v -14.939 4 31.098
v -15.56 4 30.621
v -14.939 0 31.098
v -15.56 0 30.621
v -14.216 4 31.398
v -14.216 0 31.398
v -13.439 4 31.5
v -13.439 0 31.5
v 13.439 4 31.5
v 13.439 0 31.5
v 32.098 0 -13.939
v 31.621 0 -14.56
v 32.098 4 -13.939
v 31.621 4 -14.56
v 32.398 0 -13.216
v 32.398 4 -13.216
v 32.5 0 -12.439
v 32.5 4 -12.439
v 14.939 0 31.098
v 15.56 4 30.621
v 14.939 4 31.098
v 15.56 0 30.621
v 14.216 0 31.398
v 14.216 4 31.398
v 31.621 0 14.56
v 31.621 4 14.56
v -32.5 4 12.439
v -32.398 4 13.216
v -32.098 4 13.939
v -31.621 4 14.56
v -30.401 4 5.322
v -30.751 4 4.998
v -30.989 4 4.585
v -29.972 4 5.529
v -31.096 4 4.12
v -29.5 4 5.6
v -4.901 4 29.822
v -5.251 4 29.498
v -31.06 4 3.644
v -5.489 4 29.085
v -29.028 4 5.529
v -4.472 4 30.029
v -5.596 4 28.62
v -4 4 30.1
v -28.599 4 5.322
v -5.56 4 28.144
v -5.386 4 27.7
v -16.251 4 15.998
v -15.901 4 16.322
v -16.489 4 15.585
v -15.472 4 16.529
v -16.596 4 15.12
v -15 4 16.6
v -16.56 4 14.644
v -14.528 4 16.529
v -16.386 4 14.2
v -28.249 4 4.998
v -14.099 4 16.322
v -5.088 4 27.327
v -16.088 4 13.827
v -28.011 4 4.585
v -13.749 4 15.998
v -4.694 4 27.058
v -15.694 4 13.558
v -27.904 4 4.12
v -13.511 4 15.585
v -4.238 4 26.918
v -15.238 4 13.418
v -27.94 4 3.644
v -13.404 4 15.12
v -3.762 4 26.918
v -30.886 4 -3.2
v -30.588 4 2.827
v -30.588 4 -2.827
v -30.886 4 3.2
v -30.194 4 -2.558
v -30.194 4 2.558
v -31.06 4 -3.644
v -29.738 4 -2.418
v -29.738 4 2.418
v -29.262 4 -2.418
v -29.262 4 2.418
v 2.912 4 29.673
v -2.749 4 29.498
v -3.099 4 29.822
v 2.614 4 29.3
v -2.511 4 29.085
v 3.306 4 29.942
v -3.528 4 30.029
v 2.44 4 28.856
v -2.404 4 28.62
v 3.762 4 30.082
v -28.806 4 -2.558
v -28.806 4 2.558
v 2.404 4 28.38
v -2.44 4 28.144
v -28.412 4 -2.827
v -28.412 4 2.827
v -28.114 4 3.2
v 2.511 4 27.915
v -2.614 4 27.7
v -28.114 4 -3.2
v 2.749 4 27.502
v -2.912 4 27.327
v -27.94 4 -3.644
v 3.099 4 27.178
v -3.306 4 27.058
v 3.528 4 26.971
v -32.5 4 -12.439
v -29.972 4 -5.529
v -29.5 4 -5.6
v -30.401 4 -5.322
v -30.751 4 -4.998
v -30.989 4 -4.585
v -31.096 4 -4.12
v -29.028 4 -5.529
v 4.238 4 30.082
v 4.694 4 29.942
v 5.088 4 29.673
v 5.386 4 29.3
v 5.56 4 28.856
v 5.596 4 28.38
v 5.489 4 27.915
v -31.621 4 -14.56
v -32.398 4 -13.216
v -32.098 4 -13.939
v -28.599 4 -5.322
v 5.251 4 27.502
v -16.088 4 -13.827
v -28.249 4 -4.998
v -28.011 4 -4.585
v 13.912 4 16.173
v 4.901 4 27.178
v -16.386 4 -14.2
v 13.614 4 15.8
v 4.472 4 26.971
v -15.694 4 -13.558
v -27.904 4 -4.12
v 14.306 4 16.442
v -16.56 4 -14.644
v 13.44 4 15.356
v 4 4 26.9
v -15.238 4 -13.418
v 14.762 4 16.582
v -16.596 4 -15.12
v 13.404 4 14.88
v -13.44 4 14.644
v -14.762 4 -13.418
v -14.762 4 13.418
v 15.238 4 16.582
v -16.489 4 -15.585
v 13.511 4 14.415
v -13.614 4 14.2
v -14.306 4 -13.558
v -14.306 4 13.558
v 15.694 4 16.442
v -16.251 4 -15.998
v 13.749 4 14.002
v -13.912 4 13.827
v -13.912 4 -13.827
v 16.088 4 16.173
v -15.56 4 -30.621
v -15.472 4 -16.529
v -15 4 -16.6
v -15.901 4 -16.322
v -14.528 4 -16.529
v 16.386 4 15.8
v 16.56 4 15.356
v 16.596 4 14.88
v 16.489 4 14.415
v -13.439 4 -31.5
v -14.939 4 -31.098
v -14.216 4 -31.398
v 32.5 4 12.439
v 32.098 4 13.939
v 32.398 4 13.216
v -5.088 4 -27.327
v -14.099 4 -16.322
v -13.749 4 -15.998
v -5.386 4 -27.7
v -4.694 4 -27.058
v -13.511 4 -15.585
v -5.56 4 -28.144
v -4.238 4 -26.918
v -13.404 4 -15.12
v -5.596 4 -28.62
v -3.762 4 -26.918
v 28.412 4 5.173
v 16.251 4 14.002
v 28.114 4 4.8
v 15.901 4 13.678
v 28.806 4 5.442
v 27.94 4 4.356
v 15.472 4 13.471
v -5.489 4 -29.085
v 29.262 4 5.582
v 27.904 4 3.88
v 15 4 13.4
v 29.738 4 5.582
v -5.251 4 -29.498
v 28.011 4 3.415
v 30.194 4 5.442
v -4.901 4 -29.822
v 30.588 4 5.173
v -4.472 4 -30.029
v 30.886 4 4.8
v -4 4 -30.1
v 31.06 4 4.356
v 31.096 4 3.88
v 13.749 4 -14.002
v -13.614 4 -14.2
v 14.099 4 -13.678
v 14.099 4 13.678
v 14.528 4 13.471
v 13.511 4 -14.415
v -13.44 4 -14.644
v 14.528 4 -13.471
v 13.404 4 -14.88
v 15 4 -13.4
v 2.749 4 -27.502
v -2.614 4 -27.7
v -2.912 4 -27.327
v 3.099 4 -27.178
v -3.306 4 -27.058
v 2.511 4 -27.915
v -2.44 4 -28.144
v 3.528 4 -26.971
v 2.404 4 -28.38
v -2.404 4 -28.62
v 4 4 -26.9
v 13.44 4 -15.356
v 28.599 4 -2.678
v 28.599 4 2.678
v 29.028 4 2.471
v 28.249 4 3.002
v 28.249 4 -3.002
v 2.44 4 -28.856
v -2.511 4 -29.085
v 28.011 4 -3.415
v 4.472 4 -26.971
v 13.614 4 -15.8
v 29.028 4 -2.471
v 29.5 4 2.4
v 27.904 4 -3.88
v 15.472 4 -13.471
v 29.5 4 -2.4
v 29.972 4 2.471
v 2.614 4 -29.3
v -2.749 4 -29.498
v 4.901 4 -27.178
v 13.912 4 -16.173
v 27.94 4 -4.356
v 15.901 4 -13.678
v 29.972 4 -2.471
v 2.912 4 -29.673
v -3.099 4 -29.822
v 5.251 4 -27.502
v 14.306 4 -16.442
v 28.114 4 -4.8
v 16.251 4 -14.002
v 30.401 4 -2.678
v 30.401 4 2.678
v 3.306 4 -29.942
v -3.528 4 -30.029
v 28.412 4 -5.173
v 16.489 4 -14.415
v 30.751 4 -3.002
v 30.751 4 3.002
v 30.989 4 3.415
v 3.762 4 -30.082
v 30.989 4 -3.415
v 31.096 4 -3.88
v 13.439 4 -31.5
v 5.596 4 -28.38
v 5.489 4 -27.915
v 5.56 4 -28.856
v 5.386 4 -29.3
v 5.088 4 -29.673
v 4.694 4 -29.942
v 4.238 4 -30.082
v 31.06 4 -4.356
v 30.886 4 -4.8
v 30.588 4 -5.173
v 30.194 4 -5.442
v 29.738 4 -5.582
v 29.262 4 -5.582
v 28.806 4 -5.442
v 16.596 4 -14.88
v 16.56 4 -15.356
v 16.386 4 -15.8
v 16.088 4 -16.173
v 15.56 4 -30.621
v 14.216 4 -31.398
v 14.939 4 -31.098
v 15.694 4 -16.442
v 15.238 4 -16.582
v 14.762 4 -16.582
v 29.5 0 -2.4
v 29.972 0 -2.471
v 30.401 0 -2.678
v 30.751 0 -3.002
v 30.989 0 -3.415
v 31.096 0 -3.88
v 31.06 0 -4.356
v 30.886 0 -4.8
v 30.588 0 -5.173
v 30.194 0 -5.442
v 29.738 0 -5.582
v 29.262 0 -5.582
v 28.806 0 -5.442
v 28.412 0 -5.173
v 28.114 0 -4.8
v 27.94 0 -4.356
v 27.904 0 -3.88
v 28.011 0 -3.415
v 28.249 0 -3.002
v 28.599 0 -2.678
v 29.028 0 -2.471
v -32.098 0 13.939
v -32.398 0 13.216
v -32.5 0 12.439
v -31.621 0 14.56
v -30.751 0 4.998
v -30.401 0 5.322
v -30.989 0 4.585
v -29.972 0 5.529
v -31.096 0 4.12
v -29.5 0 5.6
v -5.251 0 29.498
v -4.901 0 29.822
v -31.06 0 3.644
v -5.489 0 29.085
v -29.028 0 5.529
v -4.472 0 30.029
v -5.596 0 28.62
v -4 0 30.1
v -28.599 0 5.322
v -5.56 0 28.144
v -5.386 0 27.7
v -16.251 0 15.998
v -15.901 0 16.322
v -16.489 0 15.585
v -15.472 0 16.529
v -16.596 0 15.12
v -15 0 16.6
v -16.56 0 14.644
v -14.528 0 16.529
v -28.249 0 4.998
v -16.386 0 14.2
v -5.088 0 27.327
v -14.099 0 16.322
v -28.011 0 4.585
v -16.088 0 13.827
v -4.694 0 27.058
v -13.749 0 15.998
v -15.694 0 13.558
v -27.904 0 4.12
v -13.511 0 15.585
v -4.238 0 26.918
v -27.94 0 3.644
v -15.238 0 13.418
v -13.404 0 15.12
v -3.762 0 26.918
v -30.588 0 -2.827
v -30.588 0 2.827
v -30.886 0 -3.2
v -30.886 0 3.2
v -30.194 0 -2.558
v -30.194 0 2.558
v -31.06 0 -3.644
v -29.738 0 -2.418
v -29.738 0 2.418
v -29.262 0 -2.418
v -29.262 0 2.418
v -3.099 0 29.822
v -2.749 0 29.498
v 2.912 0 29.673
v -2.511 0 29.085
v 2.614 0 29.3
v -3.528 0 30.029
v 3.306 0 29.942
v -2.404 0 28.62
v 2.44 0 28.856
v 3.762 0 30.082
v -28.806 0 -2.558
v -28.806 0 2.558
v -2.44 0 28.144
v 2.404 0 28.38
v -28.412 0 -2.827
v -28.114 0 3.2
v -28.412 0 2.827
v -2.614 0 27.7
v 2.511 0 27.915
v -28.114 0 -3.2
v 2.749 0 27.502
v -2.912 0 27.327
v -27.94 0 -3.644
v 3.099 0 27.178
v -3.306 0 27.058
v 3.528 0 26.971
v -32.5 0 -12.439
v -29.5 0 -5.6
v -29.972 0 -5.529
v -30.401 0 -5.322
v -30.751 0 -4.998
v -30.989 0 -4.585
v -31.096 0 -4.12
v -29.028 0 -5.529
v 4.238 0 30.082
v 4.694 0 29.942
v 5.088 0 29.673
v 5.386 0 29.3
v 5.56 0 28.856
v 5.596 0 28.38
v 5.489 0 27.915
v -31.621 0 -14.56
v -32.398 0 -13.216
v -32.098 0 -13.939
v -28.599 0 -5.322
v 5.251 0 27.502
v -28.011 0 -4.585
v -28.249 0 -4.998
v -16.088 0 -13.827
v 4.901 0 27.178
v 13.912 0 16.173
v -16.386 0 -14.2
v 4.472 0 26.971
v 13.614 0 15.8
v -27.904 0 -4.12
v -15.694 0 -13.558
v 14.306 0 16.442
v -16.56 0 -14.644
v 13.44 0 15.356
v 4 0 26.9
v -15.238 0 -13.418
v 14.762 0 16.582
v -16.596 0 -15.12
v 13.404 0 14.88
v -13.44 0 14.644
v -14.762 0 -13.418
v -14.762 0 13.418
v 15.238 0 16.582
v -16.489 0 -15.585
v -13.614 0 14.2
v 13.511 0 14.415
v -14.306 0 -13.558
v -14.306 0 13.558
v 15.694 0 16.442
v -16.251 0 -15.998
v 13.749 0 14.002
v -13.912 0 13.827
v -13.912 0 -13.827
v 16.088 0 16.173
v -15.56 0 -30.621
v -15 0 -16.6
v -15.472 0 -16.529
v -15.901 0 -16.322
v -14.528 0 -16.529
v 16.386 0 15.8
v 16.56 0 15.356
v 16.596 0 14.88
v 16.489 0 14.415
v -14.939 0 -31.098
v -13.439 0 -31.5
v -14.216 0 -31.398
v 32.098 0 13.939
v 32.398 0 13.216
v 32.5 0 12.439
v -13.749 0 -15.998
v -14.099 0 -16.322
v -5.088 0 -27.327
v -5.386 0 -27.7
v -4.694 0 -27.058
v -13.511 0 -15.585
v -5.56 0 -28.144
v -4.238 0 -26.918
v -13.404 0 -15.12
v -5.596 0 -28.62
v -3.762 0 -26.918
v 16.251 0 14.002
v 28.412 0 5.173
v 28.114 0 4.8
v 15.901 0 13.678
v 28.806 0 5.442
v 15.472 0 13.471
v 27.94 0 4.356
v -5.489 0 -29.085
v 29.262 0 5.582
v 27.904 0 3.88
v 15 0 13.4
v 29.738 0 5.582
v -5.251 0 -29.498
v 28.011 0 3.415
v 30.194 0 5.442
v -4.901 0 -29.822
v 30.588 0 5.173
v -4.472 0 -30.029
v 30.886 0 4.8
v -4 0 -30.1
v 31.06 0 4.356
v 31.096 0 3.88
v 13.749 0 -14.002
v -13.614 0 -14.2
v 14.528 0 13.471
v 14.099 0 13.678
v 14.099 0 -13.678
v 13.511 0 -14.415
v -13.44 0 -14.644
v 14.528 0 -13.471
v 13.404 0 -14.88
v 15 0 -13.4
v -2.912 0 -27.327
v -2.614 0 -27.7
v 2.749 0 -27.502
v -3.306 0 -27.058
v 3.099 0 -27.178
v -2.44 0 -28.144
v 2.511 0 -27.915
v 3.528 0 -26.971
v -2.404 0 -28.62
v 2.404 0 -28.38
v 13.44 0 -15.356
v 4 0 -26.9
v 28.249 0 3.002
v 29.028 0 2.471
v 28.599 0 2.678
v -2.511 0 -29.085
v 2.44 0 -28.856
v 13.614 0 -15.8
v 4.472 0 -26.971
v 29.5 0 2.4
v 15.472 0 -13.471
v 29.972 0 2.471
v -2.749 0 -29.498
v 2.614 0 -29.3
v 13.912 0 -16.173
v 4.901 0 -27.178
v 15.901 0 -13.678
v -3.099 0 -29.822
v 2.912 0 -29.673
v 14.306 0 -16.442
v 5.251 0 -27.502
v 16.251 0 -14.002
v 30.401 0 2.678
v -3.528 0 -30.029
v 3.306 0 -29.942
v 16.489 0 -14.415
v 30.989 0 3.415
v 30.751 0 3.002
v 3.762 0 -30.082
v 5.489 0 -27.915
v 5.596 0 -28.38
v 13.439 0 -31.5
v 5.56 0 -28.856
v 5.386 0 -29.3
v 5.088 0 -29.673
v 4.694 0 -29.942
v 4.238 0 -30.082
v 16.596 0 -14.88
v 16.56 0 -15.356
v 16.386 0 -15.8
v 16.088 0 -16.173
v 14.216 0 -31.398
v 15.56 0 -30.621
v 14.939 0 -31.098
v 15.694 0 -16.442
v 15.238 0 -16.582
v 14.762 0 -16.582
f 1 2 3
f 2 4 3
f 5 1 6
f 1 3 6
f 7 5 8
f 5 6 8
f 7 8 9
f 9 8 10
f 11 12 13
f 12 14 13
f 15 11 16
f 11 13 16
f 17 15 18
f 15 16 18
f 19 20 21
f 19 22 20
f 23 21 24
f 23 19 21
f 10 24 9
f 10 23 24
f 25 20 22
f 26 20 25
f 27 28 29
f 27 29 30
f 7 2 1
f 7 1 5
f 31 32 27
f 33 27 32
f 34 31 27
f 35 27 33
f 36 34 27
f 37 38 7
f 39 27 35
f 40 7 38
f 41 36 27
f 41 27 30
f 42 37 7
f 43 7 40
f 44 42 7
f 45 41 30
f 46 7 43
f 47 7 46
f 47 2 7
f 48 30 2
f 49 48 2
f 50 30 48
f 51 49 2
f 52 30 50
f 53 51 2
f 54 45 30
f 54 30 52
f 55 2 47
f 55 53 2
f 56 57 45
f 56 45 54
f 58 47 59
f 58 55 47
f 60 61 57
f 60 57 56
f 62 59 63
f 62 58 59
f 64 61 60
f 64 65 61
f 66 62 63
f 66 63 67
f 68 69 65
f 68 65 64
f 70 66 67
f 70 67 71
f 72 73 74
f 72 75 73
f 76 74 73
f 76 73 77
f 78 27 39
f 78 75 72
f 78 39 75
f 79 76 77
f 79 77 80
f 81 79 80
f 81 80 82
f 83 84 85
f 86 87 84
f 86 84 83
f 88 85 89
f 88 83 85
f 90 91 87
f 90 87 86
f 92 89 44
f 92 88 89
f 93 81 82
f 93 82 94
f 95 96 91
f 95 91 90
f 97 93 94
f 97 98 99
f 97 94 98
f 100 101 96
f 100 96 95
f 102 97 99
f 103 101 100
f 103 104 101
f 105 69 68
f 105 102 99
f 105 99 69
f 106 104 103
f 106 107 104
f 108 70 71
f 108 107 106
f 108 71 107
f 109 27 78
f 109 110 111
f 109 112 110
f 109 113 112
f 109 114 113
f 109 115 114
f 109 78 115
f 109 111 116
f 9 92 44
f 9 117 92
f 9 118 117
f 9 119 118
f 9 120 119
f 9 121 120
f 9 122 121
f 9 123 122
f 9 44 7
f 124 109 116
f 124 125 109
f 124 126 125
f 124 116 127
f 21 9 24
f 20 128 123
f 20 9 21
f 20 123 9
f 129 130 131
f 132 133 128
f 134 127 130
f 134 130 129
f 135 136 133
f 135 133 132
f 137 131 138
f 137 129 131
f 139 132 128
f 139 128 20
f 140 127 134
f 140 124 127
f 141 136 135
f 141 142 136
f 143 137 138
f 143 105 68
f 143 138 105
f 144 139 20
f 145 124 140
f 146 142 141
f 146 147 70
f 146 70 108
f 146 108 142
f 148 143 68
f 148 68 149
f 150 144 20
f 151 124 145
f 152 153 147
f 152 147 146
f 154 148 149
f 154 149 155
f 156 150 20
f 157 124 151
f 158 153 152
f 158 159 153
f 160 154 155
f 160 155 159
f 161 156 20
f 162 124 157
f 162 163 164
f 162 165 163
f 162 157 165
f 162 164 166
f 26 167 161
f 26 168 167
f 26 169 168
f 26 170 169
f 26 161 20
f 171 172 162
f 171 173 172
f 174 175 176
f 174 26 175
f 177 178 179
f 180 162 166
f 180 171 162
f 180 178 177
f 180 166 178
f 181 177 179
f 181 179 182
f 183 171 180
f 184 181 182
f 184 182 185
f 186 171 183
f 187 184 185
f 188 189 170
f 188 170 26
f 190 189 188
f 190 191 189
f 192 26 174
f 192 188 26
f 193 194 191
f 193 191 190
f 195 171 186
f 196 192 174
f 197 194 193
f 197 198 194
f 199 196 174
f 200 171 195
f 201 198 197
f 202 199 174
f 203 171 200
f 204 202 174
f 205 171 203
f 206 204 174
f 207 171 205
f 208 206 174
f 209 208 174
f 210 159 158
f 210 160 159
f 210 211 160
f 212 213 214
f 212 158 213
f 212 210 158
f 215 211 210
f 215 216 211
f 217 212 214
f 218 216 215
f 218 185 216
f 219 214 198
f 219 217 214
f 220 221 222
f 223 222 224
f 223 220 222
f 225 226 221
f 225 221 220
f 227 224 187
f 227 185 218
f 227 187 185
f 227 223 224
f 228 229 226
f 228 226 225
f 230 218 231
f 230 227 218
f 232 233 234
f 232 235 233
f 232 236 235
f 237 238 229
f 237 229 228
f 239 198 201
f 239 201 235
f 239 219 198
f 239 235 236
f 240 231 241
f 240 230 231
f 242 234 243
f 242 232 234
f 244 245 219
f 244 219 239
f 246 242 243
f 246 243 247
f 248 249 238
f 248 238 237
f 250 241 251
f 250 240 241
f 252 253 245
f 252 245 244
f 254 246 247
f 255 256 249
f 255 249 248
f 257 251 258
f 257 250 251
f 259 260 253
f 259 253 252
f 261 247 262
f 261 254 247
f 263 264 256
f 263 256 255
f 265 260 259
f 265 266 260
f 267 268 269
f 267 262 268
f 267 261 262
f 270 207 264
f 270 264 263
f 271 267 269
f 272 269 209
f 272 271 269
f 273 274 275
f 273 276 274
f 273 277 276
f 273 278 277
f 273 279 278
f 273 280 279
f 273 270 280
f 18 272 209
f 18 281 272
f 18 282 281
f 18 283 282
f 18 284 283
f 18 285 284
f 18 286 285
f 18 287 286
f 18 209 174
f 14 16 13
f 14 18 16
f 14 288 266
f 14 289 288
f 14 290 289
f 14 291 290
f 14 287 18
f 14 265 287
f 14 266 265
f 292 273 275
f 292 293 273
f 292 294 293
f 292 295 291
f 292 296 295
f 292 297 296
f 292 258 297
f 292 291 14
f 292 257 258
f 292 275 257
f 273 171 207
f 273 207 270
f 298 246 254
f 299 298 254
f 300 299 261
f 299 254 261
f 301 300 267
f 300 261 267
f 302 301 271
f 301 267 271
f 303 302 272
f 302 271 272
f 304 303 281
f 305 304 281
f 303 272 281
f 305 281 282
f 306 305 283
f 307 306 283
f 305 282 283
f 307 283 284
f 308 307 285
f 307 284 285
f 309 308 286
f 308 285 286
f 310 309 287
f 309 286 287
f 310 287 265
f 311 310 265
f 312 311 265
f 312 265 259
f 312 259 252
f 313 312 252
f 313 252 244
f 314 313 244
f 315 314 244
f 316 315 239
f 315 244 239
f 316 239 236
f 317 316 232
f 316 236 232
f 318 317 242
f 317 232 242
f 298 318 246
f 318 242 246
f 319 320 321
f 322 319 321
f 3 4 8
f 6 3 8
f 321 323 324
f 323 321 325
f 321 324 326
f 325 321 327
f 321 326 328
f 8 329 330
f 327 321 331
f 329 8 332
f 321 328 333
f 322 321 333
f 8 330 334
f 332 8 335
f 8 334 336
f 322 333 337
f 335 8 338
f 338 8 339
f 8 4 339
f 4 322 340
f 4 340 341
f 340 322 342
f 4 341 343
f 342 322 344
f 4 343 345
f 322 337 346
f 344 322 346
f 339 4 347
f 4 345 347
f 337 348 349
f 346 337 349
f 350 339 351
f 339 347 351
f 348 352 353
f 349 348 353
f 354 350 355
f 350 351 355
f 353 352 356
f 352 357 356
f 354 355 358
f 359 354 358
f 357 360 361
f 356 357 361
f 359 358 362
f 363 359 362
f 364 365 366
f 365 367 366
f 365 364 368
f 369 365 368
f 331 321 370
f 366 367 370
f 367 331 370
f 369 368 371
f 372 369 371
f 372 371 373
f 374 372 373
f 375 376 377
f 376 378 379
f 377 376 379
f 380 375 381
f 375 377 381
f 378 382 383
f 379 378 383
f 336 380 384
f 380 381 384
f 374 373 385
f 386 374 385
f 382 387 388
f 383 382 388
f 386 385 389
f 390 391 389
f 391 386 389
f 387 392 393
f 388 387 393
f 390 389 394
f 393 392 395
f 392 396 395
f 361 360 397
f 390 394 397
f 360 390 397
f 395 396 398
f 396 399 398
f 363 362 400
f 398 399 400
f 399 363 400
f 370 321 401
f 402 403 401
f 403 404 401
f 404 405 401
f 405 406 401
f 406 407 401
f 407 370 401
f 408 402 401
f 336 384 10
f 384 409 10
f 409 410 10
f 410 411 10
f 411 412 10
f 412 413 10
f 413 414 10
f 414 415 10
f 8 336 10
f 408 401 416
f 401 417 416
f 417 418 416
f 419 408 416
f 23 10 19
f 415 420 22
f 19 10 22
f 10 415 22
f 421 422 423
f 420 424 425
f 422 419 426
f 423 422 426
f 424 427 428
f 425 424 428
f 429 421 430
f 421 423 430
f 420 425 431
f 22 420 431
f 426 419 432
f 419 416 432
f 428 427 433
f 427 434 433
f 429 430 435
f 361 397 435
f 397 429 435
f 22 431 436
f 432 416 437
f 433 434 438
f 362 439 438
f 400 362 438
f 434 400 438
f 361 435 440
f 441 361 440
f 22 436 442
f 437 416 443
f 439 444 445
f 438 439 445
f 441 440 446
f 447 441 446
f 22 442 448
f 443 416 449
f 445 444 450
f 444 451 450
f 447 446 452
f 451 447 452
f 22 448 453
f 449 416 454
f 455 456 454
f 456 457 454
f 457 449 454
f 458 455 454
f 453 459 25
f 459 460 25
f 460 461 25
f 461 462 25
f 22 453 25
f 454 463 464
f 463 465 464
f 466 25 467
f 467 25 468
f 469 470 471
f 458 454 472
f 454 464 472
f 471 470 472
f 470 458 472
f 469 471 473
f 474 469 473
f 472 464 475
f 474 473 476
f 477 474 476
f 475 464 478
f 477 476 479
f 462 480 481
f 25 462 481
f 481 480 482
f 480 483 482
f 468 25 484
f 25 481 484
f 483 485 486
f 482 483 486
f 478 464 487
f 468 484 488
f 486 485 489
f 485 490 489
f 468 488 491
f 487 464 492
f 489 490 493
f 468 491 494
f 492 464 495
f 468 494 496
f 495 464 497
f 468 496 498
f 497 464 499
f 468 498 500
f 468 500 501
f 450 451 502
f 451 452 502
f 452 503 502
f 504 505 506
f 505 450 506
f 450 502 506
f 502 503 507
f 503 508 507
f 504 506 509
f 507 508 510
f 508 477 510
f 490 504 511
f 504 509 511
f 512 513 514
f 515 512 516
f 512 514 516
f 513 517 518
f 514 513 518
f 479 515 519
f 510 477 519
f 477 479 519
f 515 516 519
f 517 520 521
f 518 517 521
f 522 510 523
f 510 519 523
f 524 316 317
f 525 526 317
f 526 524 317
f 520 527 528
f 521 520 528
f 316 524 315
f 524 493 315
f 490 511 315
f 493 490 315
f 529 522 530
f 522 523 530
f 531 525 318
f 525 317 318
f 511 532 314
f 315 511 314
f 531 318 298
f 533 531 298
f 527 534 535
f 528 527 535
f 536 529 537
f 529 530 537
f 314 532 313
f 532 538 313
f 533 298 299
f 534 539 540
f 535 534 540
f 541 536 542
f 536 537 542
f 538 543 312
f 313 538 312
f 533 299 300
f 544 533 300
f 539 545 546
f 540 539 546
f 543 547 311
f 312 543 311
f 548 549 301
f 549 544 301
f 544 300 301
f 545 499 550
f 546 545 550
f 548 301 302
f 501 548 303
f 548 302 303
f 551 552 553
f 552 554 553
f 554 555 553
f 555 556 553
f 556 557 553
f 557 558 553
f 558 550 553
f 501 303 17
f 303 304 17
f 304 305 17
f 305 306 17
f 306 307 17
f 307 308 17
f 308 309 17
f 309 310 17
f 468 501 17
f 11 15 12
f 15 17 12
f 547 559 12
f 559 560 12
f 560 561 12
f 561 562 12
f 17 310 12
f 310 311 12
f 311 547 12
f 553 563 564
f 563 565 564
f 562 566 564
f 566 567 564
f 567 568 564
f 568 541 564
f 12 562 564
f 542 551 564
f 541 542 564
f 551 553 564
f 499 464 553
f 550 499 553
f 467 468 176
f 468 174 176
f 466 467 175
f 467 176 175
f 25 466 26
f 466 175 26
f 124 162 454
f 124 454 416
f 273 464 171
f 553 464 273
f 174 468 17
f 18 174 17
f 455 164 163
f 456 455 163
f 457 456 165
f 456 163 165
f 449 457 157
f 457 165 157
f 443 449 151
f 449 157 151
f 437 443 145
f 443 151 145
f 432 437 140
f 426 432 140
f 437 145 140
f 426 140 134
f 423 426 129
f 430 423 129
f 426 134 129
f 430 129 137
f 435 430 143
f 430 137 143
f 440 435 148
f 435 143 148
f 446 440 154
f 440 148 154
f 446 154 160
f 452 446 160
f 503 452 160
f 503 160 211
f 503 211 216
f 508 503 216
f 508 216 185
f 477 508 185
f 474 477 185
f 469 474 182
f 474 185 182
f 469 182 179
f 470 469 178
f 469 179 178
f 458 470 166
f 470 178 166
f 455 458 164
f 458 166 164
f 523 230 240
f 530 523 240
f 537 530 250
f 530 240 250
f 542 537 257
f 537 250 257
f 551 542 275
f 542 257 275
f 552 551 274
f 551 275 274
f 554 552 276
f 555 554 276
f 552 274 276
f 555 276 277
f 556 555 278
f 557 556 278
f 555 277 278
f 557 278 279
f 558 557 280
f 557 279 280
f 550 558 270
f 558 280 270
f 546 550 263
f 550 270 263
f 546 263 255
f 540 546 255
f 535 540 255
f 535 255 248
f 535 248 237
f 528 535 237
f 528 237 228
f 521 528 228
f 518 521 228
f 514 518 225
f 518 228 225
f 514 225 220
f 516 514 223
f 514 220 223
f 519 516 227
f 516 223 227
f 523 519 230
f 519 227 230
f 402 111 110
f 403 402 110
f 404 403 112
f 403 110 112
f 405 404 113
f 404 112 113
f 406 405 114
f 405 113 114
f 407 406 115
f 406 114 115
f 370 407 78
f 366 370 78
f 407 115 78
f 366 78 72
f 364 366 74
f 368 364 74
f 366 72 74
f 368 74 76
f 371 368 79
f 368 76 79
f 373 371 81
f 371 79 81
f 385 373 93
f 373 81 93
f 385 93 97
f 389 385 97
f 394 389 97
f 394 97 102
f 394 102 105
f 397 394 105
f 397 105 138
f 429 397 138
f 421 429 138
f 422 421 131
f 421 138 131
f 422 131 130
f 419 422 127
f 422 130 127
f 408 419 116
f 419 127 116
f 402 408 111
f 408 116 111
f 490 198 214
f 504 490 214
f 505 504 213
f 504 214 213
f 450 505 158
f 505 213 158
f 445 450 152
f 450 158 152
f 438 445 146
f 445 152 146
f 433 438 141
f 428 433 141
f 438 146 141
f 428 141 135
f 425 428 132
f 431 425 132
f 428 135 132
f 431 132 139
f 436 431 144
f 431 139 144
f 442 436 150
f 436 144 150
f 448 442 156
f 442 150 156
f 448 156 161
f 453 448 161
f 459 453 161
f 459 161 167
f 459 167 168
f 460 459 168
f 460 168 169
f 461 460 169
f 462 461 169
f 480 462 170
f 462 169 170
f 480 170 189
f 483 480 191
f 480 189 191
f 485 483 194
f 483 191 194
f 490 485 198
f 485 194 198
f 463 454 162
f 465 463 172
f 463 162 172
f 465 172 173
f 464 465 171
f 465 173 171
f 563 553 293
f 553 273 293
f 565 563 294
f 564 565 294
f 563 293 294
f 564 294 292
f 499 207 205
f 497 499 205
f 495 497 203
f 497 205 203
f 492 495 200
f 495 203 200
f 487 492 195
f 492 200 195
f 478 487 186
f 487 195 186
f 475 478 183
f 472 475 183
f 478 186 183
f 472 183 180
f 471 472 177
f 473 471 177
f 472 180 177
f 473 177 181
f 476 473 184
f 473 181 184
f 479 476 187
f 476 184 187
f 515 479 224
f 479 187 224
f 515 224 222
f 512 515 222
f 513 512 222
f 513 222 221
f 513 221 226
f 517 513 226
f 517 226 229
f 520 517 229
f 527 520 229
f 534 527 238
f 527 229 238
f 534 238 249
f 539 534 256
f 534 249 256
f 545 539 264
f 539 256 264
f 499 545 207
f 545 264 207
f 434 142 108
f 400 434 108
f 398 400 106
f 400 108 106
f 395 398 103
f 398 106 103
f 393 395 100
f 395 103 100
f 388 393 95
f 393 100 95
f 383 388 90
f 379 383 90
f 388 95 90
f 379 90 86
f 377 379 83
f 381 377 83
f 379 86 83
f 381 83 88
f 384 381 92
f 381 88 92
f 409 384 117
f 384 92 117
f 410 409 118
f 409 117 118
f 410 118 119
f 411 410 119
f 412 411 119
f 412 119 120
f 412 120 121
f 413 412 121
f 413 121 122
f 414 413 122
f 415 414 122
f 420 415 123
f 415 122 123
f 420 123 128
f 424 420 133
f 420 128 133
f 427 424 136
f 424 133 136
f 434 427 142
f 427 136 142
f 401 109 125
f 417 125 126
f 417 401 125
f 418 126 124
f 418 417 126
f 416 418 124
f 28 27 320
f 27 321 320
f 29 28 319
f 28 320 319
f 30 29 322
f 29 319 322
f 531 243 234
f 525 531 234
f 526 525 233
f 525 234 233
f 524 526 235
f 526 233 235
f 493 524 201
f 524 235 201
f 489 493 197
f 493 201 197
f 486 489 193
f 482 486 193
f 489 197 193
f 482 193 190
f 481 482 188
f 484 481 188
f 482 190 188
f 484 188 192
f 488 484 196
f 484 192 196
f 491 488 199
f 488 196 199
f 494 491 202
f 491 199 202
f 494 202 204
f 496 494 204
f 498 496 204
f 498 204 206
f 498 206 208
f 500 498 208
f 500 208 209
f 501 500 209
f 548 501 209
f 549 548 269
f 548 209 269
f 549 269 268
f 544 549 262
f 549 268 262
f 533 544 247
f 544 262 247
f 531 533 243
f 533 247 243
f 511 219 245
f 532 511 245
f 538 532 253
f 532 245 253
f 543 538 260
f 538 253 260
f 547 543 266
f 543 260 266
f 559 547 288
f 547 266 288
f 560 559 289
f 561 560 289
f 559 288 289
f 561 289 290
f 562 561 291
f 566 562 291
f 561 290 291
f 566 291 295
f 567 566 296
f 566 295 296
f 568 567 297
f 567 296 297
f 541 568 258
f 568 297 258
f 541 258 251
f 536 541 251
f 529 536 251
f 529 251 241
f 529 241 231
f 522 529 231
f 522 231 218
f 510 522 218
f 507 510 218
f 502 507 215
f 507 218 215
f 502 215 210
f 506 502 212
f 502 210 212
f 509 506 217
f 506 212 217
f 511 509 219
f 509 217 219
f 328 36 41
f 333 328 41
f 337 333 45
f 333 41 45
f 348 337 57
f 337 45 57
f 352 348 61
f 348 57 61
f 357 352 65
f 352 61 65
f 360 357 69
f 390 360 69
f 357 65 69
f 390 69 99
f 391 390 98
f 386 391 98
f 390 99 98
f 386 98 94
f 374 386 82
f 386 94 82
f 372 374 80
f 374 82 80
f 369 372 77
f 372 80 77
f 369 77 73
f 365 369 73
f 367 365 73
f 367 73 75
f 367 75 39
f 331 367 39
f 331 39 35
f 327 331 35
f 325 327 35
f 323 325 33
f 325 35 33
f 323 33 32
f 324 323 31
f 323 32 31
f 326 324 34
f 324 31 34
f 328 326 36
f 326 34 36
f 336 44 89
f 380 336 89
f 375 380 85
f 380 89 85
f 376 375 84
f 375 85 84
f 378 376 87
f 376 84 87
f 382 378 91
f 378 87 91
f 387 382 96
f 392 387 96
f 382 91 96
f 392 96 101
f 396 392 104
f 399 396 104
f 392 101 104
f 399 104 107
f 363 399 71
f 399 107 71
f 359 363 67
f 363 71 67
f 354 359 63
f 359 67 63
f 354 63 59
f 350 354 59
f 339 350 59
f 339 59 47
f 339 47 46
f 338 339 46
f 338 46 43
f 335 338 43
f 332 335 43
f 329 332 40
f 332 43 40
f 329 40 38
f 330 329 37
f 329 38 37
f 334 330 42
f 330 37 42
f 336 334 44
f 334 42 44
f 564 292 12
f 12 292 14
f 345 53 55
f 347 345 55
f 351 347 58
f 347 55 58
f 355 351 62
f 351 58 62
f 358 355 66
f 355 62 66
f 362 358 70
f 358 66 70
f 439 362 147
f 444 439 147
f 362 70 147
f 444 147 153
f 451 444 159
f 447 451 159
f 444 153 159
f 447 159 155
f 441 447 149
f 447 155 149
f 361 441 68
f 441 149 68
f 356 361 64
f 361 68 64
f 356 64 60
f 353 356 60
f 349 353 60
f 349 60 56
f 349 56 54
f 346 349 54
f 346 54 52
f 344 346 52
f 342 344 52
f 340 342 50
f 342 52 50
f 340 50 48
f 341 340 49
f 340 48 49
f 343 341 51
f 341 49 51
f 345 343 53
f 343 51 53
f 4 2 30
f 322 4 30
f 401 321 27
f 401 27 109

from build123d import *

# Parameters (mm, degrees)
SKETCH_1_W          = 65
SKETCH_1_H          = 63
EXTRUDE_1_DEPTH     = 4
SKETCH_2_R          = 1.6
CUT_EXTRUDE_1_DEPTH = 4
SKETCH_3_R          = 1.6
CUT_EXTRUDE_2_DEPTH = 4
FILLET_1_R          = 3
CUT_EXTRUDE_3_DEPTH = 10
FILLET_2_R          = 3


with BuildPart() as part:
    # 草图1 → 凸台-拉伸1 (new body)
    with BuildSketch(Plane(origin=(0, 0, 0), x_dir=(1, 0, 0), z_dir=(0, 1, 0))):
        Rectangle(SKETCH_1_W, SKETCH_1_H)
    extrude(amount=EXTRUDE_1_DEPTH)

    # 草图2 → 切除-拉伸1 (cut)
    with BuildSketch(Plane(origin=(0, 4, 0), x_dir=(1, 0, 0), z_dir=(0, 1, 0))):
        with Locations(Location((-15, -15, 0), (0, 0, 270))):
            Circle(SKETCH_2_R)
        with Locations(Location((-15, 15, 0), (0, 0, 90))):
            Circle(SKETCH_2_R)
        with Locations(Location((15, 15, 0), (0, 0, 270))):
            Circle(SKETCH_2_R)
        with Locations(Location((15, -15, 0), (0, 0, 90))):
            Circle(SKETCH_2_R)
    extrude(amount=-CUT_EXTRUDE_1_DEPTH, mode=Mode.SUBTRACT)

    # 草图3 → 切除-拉伸2 (cut)
    with BuildSketch(Plane(origin=(0, 4, 0), x_dir=(1, 0, 0), z_dir=(0, 1, 0))):
        with Locations(Location((-4, -28.5, 0), (0, 0, 270))):
            Circle(SKETCH_3_R)
        with Locations(Location((4, -28.5, 0), (0, 0, 90))):
            Circle(SKETCH_3_R)
        with Locations(Location((4, 28.5, 0), (0, 0, 270))):
            Circle(SKETCH_3_R)
        with Locations(Location((-4, 28.5, 0), (0, 0, 90))):
            Circle(SKETCH_3_R)
        with Locations(Location((-29.5, -4, 0), (0, 0, 270))):
            Circle(SKETCH_3_R)
        with Locations(Location((-29.5, 4, 0), (0, 0, 90))):
            Circle(SKETCH_3_R)
        with Locations(Location((29.5, 4, 0), (0, 0, 270))):
            Circle(SKETCH_3_R)
        with Locations(Location((29.5, -4, 0), (0, 0, 90))):
            Circle(SKETCH_3_R)
    extrude(amount=-CUT_EXTRUDE_2_DEPTH, mode=Mode.SUBTRACT)

    # 圆角1
    fillet_1_edges = [part.edges().sort_by_distance(p)[0] for p in [
        (32.5, 2, 31.5),
        (-32.5, 2, 31.5),
        (-32.5, 2, -31.5),
        (32.5, 2, -31.5),
    ]]
    fillet(fillet_1_edges, radius=FILLET_1_R)

    # 草图5 → 切除-拉伸3 (cut)
    with BuildSketch(Plane(origin=(0, 4, 0), x_dir=(1, 0, 0), z_dir=(0, 1, 0))):
        Polygon((-47.682171846, -46.682171846), (-9.681789184, -36.5), (-37.5, -8.681789184), align=None)
        Polygon((37.5, -8.681789184), (47.682171846, -46.682171846), (9.681789184, -36.5), align=None)
        Polygon((-37.5, 8.681789184), (-47.682171846, 46.682171846), (-9.681789184, 36.5), align=None)
        Polygon((37.5, 8.681789184), (47.682171846, 46.682171846), (9.681789184, 36.5), align=None)
    extrude(amount=-CUT_EXTRUDE_3_DEPTH, mode=Mode.SUBTRACT)

    # 圆角2
    fillet_2_edges = [part.edges().sort_by_distance(p)[0] for p in [
        (32.5, 2, 13.681789184),
        (14.681789184, 2, 31.5),
        (-14.681789184, 2, -31.5),
        (-32.5, 2, -13.681789184),
        (32.5, 2, -13.681789184),
        (14.681789184, 2, -31.5),
        (-32.5, 2, 13.681789184),
        (-14.681789184, 2, 31.5),
    ]]
    fillet(fillet_2_edges, radius=FILLET_2_R)


solid = part.part
